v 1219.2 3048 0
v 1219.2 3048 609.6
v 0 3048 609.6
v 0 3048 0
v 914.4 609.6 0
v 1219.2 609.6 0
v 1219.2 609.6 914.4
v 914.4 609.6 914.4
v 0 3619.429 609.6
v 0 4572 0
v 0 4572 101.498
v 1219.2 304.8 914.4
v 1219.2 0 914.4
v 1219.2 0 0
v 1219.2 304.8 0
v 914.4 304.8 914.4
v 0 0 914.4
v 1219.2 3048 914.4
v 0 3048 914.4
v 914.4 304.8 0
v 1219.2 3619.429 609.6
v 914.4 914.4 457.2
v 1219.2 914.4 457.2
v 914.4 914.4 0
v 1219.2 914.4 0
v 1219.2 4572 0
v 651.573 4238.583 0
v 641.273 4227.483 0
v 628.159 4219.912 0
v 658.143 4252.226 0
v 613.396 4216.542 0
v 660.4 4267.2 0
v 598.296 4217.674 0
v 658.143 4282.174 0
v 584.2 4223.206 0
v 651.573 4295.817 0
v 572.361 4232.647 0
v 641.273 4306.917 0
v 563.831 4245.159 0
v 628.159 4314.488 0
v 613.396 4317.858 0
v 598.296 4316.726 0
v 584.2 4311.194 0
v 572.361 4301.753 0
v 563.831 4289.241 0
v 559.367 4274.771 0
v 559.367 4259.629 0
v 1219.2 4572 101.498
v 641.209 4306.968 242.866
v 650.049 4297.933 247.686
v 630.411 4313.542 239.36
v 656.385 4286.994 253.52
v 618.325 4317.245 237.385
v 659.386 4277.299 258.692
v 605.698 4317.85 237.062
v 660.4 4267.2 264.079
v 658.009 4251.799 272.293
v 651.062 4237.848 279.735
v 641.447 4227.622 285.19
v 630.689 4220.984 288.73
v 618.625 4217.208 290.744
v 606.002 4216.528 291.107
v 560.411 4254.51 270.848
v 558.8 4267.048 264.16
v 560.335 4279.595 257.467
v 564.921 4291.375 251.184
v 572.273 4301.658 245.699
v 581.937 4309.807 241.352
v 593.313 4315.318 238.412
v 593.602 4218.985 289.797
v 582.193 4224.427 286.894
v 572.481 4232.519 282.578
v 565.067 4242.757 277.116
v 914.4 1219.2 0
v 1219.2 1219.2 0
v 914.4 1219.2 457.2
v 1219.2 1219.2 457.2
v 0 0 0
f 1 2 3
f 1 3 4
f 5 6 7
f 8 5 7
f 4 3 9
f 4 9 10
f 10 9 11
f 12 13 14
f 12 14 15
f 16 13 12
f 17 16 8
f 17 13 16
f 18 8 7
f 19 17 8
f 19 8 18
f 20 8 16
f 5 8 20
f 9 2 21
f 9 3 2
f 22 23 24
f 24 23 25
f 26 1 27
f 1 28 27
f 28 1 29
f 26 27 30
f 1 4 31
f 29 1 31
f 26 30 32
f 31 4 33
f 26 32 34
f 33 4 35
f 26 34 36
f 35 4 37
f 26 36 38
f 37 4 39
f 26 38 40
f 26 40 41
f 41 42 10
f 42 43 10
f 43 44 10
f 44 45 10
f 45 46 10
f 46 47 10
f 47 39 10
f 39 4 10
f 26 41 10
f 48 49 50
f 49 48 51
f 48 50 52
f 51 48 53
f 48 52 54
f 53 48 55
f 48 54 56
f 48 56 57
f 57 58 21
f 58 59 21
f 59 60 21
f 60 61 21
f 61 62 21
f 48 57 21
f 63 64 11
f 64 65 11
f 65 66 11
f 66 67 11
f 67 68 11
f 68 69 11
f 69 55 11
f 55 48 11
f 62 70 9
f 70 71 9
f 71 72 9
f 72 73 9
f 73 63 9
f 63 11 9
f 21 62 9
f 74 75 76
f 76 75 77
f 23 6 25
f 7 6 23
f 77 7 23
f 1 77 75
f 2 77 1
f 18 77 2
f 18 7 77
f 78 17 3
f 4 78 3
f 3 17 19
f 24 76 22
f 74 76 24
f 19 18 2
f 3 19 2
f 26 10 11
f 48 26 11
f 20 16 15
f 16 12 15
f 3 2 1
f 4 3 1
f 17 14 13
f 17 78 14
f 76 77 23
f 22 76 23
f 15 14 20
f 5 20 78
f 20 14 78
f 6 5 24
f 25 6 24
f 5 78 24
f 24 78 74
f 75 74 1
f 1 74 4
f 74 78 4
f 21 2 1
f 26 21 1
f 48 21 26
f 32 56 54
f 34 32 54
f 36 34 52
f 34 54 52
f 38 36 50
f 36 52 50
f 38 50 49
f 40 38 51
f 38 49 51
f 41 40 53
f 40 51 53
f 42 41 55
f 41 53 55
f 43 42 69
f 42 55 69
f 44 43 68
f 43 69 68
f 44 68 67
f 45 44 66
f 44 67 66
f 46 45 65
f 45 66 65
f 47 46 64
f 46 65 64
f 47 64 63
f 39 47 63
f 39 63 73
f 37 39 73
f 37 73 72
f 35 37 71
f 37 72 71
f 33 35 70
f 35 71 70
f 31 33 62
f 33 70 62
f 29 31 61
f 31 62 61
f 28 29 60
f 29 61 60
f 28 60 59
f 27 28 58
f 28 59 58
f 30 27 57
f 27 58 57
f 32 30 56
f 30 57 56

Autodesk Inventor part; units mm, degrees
ref_plane "YZ Plane" through (0, 0, 0) normal (1, 0, 0) x (0, 1, 0)
ref_plane "XZ Plane" through (0, 0, 0) normal (0, 1, 0) x (-1, 0, 0)
ref_plane "XY Plane" through (0, 0, 0) normal (0, 0, 1) x (1, 0, 0)
sketch "Sketch1" plane through (0, 0, 0) normal (1, 0, 0) x (0, 1, 0)
  line L0 (0, 0) -> (4572, 0)
  line L1 (0, 0) -> (0, 914.4)
  line L2 (0, 914.4) -> (3048, 914.4)
  line L3 (3048, 914.4) -> (3048, 609.6)
  line L4 (4572, 0) -> (4572, 101.4984)
  line L5 (4572, 101.4984) -> (3619.4286, 609.6)
  line L6 (3048, 609.6) -> (3619.4286, 609.6)
  dimension "d0" = 4572
  dimension "d1" = 914.4
  dimension "d2" = 3048
  dimension "d3" = 304.8
  dimension "d4" = 101.4984
  dimension "d5" = 571.4286
extrude "Extrusion1" add sketch "Sketch1" along normal blind 1219.2
sketch "Sketch2" plane through (1219.2, 0, 0) normal (1, 0, 0) x (0, 0, -1)
  line L0 (0, 0) -> (0, 4572) projected
  line L1 (-914.4, 3048) -> (-914.4, 0) projected
  line L2 (0, 609.6) -> (-914.4, 609.6)
  line L3 (-914.4, 609.6) -> (-914.4, 304.8)
  line L4 (-914.4, 304.8) -> (0, 304.8)
  line L5 (0, 304.8) -> (0, 609.6)
  line L6 (0, 1219.2) -> (-914.4, 1219.2)
  line L7 (-914.4, 1219.2) -> (-914.4, 914.4)
  line L8 (-914.4, 914.4) -> (0, 914.4)
  line L9 (0, 914.4) -> (0, 1219.2)
  line L10 (-457.2, 1219.2) -> (-457.2, 914.4)
  point P0 (0, 304.8)
  point P1 (0, 914.4)
  dimension "d8" = 304.8
  dimension "d9" = 304.8
  dimension "d10" = 304.8
  dimension "d11" = 304.8
  dimension "d12" = 304.8
  dimension "d13" = 304.8
extrude "Extrusion2" cut sketch "Sketch2" against normal blind 304.8 contours L4 L1 L2 L0 | L8 L10 L6 L0
sketch "Sketch3" plane through (0, 3048, 609.6) normal (0, 0, 1) x (1, 0, 0)
  line L0 (0, 1524) -> (0, 571.4286) projected
  line L1 (0, 571.4286) -> (1219.2, 571.4286) projected
  line L2 (1219.2, 1524) -> (1219.2, 571.4286) projected
  line L3 (0, 1524) -> (1219.2, 1524) projected
  line L4 (0, 1524) -> (1219.2, 1524) construction
  line L5 (609.6, 1524) -> (609.6, 571.4286) construction
  line L6 (0, -3048) -> (0, 1524) construction
  line L7 (0, 1219.2) -> (1219.2, 1219.2) construction
  circle A0 centre (609.6, 1219.2) radius 152.4 construction
  circle A1 centre (609.6, 1219.2) radius 50.8
  dimension "d16" = 304.8
  dimension "d17" = 304.8
  dimension "d18" = 101.6
extrude "Extrusion3" cut sketch "Sketch3" against normal through all contours A1
sketch "Sketch5" plane through (1219.2, 0, 0) normal (1, 0, 0) x (0, 0, -1)
  line L0 (-1300.5956, 3048) -> (224.2837, 3048)
  point P0 (0, 0)
  point P1 (-914.4, 3048)
surface extrude "ExtrusionSrf1" sketch "Sketch5" against normal up to next shown yes curves L0
split body "Split1" result two bodies by surface "ExtrusionSrf1" first body at (711.2, 2235.2, 913.9)
equation "\"d9\" = d8"
equation "\"d10\" = d8"
properties part number "blocks" material "Granite, Cut, Polished"
